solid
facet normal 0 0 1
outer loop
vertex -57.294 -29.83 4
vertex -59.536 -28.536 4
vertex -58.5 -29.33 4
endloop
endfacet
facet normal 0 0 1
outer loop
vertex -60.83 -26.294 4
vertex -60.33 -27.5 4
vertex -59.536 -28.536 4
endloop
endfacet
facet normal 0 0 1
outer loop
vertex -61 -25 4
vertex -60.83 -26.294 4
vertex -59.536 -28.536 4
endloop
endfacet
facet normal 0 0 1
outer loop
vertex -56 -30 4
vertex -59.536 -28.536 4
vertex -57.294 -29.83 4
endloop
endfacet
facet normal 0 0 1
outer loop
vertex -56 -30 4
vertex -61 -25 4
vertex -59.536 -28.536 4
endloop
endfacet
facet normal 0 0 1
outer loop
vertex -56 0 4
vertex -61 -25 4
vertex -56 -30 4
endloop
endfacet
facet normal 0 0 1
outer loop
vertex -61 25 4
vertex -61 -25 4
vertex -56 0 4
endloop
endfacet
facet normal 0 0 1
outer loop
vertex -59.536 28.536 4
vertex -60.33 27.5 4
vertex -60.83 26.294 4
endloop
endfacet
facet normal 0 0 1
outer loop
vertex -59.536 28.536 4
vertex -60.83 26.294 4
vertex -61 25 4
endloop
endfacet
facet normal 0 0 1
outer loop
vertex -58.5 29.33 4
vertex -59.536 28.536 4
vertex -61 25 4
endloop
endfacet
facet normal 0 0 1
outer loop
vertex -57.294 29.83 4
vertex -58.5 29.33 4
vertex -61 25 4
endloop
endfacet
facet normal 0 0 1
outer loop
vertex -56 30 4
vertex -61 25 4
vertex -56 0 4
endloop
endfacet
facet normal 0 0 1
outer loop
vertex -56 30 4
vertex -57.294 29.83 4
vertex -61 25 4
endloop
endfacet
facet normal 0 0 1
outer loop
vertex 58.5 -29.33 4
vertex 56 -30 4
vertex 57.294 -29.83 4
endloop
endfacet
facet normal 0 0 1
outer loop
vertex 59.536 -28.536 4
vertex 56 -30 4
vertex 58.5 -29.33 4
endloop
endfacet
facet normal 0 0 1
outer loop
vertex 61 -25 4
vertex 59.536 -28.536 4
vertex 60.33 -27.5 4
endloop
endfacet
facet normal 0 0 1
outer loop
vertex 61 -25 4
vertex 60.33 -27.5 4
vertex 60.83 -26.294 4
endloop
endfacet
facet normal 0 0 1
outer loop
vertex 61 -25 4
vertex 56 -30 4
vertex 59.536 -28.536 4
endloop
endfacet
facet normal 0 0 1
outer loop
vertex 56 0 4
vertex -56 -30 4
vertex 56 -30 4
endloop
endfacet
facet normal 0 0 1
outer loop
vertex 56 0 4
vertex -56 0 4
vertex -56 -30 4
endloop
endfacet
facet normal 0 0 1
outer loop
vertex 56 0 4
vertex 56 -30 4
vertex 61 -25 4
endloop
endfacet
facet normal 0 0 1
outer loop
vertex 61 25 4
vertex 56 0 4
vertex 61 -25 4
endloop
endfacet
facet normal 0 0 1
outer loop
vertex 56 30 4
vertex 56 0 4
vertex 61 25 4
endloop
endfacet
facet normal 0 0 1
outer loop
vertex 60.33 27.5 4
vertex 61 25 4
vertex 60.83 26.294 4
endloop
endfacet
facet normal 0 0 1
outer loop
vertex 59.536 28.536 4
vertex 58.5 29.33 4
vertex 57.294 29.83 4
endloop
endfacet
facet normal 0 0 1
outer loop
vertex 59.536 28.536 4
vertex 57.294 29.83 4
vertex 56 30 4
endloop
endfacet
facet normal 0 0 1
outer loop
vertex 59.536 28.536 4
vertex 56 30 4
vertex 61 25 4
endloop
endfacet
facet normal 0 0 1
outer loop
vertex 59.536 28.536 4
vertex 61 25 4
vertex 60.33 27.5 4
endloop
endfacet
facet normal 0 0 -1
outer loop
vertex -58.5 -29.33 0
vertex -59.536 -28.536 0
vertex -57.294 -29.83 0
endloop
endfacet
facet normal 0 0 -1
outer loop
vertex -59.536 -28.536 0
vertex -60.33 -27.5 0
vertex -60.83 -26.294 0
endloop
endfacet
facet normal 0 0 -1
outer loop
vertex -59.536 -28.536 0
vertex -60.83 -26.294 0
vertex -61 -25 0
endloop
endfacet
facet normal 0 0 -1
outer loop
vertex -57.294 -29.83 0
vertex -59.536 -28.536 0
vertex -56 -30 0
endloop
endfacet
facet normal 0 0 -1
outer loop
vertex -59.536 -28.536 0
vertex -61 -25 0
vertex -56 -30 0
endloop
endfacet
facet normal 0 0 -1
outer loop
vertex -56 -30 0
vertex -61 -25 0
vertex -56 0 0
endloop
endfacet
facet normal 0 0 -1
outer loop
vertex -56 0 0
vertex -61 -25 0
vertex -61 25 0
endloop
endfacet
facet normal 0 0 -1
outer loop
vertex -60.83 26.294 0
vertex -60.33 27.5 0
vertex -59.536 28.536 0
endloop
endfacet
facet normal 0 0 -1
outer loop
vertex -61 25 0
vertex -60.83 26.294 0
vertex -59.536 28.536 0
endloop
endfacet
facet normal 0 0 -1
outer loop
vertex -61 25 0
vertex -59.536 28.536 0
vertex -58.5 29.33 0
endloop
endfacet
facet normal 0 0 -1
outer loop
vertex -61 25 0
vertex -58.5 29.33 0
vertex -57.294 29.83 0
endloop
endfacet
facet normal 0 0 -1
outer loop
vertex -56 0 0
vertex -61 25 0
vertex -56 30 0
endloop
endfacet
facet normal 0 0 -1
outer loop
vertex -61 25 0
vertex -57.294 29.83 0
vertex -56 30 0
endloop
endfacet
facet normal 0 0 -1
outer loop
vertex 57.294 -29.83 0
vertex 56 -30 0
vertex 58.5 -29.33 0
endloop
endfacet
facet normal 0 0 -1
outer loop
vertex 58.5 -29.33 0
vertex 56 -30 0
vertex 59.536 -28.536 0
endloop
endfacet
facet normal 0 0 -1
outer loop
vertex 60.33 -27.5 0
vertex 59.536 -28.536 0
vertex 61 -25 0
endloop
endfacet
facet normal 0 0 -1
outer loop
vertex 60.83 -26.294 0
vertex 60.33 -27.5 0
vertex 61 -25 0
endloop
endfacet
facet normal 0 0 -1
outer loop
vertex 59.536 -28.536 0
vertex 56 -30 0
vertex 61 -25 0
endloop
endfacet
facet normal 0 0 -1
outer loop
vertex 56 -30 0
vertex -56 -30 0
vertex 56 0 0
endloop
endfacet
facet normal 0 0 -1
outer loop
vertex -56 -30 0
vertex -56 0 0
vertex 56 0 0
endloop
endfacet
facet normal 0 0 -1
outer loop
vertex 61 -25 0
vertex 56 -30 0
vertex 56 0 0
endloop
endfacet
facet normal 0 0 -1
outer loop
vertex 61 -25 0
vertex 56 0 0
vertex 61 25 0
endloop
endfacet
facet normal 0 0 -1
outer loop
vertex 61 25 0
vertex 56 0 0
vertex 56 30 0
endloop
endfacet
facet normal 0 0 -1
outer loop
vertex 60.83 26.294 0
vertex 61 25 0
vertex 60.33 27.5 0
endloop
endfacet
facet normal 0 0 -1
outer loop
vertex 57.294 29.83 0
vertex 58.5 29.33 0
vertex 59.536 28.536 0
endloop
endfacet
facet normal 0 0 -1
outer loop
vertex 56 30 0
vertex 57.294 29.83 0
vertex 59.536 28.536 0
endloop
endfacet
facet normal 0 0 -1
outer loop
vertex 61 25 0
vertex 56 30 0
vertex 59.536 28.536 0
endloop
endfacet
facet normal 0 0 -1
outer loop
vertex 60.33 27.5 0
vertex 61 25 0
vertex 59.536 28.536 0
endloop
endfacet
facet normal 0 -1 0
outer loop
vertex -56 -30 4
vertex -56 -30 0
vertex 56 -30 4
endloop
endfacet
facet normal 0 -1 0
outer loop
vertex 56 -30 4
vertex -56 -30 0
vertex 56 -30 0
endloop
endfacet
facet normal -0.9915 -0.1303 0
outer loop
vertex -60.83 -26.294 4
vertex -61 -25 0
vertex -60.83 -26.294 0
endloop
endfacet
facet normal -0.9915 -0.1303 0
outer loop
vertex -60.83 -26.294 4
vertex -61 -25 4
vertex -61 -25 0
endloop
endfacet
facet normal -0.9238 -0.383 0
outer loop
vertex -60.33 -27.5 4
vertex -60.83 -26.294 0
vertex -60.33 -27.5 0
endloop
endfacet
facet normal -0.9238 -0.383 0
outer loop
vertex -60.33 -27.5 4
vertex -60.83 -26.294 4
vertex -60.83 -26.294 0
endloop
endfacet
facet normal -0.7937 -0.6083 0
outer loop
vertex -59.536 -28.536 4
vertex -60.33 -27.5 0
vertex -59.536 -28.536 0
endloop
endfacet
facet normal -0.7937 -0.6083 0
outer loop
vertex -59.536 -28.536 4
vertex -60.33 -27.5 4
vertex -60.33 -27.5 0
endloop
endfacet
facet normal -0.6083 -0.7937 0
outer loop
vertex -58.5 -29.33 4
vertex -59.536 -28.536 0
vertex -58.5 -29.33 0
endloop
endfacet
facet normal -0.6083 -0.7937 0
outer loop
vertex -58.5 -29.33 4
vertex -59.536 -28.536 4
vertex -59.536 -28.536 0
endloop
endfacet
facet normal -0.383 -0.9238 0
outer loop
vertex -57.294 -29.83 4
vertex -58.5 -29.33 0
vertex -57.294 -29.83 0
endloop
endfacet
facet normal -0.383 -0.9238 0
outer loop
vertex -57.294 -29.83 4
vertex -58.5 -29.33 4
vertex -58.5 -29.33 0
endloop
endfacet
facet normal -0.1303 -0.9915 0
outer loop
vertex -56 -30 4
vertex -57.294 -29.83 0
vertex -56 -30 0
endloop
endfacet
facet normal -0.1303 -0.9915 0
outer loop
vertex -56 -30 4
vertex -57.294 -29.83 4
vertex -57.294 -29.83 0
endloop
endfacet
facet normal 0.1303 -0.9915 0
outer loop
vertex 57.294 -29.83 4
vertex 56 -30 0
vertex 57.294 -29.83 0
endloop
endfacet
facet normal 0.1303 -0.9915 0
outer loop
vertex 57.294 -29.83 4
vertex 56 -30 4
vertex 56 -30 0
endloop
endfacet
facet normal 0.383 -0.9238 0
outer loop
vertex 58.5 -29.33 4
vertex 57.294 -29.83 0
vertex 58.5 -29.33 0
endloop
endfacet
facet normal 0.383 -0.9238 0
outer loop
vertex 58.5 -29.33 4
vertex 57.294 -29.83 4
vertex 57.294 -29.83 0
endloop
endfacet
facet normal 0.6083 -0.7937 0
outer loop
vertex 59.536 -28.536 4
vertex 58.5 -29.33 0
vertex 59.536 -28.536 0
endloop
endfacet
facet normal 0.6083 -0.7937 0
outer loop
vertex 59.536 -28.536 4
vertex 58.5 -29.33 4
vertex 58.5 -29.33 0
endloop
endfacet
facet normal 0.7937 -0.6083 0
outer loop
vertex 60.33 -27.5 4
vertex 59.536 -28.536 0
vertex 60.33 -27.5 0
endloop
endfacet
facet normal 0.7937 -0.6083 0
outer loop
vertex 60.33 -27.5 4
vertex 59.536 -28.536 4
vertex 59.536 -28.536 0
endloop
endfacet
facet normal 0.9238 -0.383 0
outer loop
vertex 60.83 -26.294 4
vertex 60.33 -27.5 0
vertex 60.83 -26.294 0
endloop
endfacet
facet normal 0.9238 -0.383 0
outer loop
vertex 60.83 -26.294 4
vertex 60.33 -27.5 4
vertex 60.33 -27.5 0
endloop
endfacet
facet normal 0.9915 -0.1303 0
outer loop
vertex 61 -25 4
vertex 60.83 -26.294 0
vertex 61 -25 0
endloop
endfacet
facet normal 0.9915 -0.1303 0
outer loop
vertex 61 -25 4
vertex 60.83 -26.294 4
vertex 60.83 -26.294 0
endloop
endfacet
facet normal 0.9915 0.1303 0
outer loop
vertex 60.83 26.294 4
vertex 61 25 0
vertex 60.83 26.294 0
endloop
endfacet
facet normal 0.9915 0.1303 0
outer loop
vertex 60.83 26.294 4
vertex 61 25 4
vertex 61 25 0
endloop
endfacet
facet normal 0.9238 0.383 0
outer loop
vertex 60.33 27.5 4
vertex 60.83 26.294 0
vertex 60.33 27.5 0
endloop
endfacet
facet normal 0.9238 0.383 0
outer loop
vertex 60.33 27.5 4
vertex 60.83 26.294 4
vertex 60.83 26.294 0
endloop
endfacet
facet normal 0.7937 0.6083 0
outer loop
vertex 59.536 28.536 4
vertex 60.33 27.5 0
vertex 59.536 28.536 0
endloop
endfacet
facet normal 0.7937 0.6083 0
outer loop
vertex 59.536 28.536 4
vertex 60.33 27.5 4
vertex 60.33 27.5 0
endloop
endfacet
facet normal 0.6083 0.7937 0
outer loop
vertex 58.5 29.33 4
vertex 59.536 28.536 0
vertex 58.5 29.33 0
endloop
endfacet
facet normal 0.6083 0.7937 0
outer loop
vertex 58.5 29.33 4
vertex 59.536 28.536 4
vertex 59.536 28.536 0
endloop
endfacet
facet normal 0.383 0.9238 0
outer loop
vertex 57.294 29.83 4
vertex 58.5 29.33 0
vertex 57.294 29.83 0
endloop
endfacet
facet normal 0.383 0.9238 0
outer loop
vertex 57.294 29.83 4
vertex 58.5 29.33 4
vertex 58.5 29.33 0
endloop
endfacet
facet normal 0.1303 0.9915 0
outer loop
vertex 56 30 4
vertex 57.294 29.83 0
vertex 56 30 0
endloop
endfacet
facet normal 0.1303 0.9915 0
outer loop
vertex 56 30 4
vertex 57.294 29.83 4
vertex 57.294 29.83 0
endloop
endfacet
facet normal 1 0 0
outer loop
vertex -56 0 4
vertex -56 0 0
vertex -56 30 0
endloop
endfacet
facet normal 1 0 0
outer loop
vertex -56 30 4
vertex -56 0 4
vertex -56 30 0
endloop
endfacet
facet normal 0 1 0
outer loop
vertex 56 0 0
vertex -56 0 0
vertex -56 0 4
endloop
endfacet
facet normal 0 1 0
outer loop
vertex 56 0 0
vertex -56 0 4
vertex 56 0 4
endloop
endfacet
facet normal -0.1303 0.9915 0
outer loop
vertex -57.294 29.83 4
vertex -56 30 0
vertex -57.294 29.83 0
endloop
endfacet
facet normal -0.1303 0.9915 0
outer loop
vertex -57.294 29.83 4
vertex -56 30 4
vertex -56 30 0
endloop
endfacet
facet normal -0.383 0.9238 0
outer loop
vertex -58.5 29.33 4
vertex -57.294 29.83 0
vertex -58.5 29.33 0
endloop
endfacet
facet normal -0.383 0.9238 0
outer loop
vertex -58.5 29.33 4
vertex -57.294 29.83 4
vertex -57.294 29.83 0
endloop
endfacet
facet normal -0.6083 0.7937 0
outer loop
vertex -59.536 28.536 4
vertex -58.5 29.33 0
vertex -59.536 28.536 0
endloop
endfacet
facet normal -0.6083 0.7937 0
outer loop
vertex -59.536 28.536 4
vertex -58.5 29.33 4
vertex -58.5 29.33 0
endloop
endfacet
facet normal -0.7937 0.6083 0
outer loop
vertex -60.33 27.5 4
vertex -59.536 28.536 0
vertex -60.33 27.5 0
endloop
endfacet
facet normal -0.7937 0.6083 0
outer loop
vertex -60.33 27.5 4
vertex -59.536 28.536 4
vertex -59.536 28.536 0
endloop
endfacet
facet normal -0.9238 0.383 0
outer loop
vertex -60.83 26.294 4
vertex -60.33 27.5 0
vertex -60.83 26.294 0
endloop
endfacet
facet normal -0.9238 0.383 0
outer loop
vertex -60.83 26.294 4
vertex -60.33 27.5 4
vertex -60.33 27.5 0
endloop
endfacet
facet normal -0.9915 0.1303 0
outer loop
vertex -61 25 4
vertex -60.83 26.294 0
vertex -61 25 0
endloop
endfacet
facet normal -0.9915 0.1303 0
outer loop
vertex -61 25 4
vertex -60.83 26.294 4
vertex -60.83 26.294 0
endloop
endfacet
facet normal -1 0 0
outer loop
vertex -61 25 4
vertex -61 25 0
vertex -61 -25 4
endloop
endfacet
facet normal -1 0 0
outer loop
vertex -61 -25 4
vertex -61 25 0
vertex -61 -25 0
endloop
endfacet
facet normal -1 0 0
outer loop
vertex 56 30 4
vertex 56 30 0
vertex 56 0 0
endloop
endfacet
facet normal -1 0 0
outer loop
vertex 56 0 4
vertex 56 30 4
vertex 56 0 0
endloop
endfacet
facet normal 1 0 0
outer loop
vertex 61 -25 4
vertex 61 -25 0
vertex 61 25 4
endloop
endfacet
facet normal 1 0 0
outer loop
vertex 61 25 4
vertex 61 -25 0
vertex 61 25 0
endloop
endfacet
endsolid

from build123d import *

# Parameters (mm, degrees)
F0_W     = 112
F0_H     = 30
F1_DEPTH = 4
F2_R     = 4.99999


# Not quite as in the source:
# - a fillet or chamfer is up to 0.001 mm smaller than in the source, because OpenCascade refuses the exact size


with BuildPart() as f1:
    # F0 (on Top) → F1 (new body)
    with BuildSketch(Plane.XY):
        with Locations((0, -15)):
            Rectangle(F0_W, F0_H)
        Polygon((-56, -30), (-56, 0), (-56, 30), (-61, 30), (-61, -30), align=None)
        Polygon((56, 30), (56, 0), (56, -30), (61, -30), (61, 30), align=None)
    extrude(amount=F1_DEPTH)

    # F2 (radius 5 in the source; OpenCascade refuses exactly that, so slightly less here)
    f2_edges = [f1.edges().sort_by_distance(p)[0] for p in [
        (-61, -30, 2),
        (61, -30, 2),
        (61, 30, 2),
        (-61, 30, 2),
    ]]
    fillet(f2_edges, radius=F2_R)


solid = f1.part
